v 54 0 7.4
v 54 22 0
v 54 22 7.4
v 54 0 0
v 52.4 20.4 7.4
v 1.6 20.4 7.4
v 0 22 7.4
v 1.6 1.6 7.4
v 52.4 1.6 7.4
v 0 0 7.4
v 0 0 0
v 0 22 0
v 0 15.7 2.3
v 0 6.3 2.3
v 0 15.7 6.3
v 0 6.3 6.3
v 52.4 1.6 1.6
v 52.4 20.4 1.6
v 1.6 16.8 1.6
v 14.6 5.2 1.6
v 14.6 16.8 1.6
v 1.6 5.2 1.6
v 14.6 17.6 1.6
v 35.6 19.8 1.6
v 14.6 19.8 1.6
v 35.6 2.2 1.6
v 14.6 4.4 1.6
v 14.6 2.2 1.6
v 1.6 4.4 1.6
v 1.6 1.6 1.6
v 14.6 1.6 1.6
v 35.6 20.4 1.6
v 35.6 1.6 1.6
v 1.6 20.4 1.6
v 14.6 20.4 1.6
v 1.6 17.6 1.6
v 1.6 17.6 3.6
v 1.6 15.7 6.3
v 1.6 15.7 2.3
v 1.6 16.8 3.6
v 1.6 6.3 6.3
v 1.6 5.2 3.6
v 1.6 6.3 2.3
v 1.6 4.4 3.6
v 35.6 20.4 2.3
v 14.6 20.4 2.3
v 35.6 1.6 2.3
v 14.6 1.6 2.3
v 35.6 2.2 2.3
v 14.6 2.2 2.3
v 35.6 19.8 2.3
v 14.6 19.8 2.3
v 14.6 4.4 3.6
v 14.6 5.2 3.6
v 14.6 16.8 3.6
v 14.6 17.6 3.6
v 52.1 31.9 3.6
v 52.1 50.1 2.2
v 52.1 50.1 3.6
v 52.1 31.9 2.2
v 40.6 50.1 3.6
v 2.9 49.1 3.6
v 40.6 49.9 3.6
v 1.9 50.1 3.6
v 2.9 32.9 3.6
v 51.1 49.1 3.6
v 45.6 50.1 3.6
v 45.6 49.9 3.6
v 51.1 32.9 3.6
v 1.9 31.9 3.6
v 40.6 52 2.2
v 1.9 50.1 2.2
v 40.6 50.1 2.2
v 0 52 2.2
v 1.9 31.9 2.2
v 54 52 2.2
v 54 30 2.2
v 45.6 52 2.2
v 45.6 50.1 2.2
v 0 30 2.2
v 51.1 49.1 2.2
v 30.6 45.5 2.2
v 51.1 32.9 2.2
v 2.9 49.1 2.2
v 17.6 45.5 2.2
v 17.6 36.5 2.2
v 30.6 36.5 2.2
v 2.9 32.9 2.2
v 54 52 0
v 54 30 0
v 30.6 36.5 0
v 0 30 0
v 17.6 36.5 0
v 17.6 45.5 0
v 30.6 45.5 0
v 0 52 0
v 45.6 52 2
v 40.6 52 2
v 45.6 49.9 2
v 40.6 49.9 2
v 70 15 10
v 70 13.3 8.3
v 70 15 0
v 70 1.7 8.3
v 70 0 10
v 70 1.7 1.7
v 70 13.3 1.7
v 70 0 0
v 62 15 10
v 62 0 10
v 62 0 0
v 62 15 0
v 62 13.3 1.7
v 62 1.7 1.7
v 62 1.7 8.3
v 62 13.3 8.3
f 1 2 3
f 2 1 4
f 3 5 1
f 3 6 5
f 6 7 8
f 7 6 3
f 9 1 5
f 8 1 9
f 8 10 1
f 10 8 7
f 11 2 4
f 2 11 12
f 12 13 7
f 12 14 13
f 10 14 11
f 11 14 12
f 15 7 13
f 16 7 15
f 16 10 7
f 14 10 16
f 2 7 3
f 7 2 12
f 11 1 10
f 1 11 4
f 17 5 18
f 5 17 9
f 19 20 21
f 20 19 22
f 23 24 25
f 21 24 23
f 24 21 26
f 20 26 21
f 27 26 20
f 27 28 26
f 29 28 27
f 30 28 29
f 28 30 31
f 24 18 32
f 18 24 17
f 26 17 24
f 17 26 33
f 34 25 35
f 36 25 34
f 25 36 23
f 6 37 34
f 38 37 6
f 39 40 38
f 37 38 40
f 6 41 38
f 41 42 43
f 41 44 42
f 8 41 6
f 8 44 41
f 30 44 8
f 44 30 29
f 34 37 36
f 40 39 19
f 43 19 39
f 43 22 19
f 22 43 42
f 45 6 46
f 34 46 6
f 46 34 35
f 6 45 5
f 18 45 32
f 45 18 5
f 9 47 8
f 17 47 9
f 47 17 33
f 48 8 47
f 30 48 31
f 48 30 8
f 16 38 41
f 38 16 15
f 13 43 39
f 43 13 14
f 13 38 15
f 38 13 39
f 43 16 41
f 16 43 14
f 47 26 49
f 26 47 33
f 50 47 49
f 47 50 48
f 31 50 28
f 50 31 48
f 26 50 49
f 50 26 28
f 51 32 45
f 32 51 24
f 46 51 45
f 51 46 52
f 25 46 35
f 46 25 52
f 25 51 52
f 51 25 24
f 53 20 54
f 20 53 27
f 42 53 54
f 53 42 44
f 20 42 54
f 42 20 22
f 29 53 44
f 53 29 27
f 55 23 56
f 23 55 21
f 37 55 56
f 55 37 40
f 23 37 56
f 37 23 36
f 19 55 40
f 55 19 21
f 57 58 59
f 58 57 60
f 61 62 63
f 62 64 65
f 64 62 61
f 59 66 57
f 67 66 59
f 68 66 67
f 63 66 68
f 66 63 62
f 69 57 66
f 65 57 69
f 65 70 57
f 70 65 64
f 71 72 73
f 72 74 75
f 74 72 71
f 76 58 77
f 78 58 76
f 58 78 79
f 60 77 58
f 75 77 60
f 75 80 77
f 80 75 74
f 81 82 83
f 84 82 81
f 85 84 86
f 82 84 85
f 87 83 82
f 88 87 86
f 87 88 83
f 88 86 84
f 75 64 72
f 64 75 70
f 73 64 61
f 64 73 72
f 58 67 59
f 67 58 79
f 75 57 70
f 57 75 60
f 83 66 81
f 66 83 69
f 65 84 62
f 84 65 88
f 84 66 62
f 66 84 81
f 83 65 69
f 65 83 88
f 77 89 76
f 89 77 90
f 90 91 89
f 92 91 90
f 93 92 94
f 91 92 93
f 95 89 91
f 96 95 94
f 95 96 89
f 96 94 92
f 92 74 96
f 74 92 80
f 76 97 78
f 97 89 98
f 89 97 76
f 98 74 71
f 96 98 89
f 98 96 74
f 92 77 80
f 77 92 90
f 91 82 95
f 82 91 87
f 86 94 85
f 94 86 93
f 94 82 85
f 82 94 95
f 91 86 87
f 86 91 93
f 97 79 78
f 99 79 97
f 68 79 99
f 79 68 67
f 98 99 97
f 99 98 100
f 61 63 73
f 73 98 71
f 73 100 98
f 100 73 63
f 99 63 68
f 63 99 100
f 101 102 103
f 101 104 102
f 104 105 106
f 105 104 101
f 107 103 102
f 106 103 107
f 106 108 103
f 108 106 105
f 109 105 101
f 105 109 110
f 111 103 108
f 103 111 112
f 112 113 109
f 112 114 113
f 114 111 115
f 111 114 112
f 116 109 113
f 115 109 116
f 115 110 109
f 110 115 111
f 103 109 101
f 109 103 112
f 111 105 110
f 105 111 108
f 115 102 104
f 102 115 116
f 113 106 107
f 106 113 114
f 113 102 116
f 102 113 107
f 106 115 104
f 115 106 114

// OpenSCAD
// Magicsee R1 / XIAO ESP32S3 receiver case
// Target: KOYOKOMA USB-C male-to-male, Amazon ASIN B0CZ9HRKK4
// TEST PRINT: adapter appearance may vary by production lot.

part = "layout"; // "bottom", "lid", "gauge", or "layout"

adapter_total = 27.0;
adapter_w = 11.0;
adapter_h = 6.0;
usb_c_projection = 7.0;
adapter_body = adapter_total - 2 * usb_c_projection;
xiao_l = 21.0;
xiao_w = 17.8;

fit = 0.30;
wall = 1.60;
floor_h = 1.60;
lid_h = 2.20;
lip_h = 1.40;
lip_t = 1.00;

case_x = 54.0;
case_y = 22.0;
bottom_z = 7.4;
adapter_x = wall;
board_x = adapter_x + adapter_body;
antenna_x = board_x + xiao_l + 1.0;

module bottom() {
  difference() {
    cube([case_x, case_y, bottom_z]);
    translate([wall, wall, floor_h])
      cube([case_x-2*wall, case_y-2*wall, bottom_z-floor_h+1]);
    translate([-0.5, (case_y-9.4)/2, floor_h+0.7])
      cube([wall+1, 9.4, 4.0]);
  }
  board_y = (case_y-xiao_w)/2;
  translate([board_x, board_y-0.7, floor_h]) cube([xiao_l,0.8,0.7]);
  translate([board_x, board_y+xiao_w-0.1, floor_h]) cube([xiao_l,0.8,0.7]);
  guide_y = (case_y-(adapter_w+2*fit))/2;
  translate([adapter_x, guide_y-0.8, floor_h]) cube([adapter_body,0.8,2]);
  translate([adapter_x, guide_y+adapter_w+2*fit, floor_h]) cube([adapter_body,0.8,2]);
}

module lid() {
  difference() {
    union() {
      cube([case_x, case_y, lid_h]);
      difference() {
        translate([wall+fit, wall+fit, lid_h])
          cube([case_x-2*(wall+fit), case_y-2*(wall+fit), lip_h]);
        translate([wall+fit+lip_t, wall+fit+lip_t, lid_h-0.1])
          cube([case_x-2*(wall+fit+lip_t),
                case_y-2*(wall+fit+lip_t), lip_h+0.2]);
      }
    }
    translate([board_x+3, (case_y-9)/2, -1])
      cube([13,9,lid_h+lip_h+2]);
    translate([antenna_x+4, case_y-wall-0.5, lid_h-0.2])
      cube([5,wall+1,2]);
  }
}

module gauge() {
  difference() {
    cube([8,15,10]);
    translate([-1,(15-adapter_w-2*fit)/2,(10-adapter_h-2*fit)/2])
      cube([10,adapter_w+2*fit,adapter_h+2*fit]);
  }
}

if (part == "bottom") bottom();
else if (part == "lid") lid();
else if (part == "gauge") gauge();
else {
  bottom();
  translate([0,case_y+8,0]) lid();
  translate([case_x+8,0,0]) gauge();
}
